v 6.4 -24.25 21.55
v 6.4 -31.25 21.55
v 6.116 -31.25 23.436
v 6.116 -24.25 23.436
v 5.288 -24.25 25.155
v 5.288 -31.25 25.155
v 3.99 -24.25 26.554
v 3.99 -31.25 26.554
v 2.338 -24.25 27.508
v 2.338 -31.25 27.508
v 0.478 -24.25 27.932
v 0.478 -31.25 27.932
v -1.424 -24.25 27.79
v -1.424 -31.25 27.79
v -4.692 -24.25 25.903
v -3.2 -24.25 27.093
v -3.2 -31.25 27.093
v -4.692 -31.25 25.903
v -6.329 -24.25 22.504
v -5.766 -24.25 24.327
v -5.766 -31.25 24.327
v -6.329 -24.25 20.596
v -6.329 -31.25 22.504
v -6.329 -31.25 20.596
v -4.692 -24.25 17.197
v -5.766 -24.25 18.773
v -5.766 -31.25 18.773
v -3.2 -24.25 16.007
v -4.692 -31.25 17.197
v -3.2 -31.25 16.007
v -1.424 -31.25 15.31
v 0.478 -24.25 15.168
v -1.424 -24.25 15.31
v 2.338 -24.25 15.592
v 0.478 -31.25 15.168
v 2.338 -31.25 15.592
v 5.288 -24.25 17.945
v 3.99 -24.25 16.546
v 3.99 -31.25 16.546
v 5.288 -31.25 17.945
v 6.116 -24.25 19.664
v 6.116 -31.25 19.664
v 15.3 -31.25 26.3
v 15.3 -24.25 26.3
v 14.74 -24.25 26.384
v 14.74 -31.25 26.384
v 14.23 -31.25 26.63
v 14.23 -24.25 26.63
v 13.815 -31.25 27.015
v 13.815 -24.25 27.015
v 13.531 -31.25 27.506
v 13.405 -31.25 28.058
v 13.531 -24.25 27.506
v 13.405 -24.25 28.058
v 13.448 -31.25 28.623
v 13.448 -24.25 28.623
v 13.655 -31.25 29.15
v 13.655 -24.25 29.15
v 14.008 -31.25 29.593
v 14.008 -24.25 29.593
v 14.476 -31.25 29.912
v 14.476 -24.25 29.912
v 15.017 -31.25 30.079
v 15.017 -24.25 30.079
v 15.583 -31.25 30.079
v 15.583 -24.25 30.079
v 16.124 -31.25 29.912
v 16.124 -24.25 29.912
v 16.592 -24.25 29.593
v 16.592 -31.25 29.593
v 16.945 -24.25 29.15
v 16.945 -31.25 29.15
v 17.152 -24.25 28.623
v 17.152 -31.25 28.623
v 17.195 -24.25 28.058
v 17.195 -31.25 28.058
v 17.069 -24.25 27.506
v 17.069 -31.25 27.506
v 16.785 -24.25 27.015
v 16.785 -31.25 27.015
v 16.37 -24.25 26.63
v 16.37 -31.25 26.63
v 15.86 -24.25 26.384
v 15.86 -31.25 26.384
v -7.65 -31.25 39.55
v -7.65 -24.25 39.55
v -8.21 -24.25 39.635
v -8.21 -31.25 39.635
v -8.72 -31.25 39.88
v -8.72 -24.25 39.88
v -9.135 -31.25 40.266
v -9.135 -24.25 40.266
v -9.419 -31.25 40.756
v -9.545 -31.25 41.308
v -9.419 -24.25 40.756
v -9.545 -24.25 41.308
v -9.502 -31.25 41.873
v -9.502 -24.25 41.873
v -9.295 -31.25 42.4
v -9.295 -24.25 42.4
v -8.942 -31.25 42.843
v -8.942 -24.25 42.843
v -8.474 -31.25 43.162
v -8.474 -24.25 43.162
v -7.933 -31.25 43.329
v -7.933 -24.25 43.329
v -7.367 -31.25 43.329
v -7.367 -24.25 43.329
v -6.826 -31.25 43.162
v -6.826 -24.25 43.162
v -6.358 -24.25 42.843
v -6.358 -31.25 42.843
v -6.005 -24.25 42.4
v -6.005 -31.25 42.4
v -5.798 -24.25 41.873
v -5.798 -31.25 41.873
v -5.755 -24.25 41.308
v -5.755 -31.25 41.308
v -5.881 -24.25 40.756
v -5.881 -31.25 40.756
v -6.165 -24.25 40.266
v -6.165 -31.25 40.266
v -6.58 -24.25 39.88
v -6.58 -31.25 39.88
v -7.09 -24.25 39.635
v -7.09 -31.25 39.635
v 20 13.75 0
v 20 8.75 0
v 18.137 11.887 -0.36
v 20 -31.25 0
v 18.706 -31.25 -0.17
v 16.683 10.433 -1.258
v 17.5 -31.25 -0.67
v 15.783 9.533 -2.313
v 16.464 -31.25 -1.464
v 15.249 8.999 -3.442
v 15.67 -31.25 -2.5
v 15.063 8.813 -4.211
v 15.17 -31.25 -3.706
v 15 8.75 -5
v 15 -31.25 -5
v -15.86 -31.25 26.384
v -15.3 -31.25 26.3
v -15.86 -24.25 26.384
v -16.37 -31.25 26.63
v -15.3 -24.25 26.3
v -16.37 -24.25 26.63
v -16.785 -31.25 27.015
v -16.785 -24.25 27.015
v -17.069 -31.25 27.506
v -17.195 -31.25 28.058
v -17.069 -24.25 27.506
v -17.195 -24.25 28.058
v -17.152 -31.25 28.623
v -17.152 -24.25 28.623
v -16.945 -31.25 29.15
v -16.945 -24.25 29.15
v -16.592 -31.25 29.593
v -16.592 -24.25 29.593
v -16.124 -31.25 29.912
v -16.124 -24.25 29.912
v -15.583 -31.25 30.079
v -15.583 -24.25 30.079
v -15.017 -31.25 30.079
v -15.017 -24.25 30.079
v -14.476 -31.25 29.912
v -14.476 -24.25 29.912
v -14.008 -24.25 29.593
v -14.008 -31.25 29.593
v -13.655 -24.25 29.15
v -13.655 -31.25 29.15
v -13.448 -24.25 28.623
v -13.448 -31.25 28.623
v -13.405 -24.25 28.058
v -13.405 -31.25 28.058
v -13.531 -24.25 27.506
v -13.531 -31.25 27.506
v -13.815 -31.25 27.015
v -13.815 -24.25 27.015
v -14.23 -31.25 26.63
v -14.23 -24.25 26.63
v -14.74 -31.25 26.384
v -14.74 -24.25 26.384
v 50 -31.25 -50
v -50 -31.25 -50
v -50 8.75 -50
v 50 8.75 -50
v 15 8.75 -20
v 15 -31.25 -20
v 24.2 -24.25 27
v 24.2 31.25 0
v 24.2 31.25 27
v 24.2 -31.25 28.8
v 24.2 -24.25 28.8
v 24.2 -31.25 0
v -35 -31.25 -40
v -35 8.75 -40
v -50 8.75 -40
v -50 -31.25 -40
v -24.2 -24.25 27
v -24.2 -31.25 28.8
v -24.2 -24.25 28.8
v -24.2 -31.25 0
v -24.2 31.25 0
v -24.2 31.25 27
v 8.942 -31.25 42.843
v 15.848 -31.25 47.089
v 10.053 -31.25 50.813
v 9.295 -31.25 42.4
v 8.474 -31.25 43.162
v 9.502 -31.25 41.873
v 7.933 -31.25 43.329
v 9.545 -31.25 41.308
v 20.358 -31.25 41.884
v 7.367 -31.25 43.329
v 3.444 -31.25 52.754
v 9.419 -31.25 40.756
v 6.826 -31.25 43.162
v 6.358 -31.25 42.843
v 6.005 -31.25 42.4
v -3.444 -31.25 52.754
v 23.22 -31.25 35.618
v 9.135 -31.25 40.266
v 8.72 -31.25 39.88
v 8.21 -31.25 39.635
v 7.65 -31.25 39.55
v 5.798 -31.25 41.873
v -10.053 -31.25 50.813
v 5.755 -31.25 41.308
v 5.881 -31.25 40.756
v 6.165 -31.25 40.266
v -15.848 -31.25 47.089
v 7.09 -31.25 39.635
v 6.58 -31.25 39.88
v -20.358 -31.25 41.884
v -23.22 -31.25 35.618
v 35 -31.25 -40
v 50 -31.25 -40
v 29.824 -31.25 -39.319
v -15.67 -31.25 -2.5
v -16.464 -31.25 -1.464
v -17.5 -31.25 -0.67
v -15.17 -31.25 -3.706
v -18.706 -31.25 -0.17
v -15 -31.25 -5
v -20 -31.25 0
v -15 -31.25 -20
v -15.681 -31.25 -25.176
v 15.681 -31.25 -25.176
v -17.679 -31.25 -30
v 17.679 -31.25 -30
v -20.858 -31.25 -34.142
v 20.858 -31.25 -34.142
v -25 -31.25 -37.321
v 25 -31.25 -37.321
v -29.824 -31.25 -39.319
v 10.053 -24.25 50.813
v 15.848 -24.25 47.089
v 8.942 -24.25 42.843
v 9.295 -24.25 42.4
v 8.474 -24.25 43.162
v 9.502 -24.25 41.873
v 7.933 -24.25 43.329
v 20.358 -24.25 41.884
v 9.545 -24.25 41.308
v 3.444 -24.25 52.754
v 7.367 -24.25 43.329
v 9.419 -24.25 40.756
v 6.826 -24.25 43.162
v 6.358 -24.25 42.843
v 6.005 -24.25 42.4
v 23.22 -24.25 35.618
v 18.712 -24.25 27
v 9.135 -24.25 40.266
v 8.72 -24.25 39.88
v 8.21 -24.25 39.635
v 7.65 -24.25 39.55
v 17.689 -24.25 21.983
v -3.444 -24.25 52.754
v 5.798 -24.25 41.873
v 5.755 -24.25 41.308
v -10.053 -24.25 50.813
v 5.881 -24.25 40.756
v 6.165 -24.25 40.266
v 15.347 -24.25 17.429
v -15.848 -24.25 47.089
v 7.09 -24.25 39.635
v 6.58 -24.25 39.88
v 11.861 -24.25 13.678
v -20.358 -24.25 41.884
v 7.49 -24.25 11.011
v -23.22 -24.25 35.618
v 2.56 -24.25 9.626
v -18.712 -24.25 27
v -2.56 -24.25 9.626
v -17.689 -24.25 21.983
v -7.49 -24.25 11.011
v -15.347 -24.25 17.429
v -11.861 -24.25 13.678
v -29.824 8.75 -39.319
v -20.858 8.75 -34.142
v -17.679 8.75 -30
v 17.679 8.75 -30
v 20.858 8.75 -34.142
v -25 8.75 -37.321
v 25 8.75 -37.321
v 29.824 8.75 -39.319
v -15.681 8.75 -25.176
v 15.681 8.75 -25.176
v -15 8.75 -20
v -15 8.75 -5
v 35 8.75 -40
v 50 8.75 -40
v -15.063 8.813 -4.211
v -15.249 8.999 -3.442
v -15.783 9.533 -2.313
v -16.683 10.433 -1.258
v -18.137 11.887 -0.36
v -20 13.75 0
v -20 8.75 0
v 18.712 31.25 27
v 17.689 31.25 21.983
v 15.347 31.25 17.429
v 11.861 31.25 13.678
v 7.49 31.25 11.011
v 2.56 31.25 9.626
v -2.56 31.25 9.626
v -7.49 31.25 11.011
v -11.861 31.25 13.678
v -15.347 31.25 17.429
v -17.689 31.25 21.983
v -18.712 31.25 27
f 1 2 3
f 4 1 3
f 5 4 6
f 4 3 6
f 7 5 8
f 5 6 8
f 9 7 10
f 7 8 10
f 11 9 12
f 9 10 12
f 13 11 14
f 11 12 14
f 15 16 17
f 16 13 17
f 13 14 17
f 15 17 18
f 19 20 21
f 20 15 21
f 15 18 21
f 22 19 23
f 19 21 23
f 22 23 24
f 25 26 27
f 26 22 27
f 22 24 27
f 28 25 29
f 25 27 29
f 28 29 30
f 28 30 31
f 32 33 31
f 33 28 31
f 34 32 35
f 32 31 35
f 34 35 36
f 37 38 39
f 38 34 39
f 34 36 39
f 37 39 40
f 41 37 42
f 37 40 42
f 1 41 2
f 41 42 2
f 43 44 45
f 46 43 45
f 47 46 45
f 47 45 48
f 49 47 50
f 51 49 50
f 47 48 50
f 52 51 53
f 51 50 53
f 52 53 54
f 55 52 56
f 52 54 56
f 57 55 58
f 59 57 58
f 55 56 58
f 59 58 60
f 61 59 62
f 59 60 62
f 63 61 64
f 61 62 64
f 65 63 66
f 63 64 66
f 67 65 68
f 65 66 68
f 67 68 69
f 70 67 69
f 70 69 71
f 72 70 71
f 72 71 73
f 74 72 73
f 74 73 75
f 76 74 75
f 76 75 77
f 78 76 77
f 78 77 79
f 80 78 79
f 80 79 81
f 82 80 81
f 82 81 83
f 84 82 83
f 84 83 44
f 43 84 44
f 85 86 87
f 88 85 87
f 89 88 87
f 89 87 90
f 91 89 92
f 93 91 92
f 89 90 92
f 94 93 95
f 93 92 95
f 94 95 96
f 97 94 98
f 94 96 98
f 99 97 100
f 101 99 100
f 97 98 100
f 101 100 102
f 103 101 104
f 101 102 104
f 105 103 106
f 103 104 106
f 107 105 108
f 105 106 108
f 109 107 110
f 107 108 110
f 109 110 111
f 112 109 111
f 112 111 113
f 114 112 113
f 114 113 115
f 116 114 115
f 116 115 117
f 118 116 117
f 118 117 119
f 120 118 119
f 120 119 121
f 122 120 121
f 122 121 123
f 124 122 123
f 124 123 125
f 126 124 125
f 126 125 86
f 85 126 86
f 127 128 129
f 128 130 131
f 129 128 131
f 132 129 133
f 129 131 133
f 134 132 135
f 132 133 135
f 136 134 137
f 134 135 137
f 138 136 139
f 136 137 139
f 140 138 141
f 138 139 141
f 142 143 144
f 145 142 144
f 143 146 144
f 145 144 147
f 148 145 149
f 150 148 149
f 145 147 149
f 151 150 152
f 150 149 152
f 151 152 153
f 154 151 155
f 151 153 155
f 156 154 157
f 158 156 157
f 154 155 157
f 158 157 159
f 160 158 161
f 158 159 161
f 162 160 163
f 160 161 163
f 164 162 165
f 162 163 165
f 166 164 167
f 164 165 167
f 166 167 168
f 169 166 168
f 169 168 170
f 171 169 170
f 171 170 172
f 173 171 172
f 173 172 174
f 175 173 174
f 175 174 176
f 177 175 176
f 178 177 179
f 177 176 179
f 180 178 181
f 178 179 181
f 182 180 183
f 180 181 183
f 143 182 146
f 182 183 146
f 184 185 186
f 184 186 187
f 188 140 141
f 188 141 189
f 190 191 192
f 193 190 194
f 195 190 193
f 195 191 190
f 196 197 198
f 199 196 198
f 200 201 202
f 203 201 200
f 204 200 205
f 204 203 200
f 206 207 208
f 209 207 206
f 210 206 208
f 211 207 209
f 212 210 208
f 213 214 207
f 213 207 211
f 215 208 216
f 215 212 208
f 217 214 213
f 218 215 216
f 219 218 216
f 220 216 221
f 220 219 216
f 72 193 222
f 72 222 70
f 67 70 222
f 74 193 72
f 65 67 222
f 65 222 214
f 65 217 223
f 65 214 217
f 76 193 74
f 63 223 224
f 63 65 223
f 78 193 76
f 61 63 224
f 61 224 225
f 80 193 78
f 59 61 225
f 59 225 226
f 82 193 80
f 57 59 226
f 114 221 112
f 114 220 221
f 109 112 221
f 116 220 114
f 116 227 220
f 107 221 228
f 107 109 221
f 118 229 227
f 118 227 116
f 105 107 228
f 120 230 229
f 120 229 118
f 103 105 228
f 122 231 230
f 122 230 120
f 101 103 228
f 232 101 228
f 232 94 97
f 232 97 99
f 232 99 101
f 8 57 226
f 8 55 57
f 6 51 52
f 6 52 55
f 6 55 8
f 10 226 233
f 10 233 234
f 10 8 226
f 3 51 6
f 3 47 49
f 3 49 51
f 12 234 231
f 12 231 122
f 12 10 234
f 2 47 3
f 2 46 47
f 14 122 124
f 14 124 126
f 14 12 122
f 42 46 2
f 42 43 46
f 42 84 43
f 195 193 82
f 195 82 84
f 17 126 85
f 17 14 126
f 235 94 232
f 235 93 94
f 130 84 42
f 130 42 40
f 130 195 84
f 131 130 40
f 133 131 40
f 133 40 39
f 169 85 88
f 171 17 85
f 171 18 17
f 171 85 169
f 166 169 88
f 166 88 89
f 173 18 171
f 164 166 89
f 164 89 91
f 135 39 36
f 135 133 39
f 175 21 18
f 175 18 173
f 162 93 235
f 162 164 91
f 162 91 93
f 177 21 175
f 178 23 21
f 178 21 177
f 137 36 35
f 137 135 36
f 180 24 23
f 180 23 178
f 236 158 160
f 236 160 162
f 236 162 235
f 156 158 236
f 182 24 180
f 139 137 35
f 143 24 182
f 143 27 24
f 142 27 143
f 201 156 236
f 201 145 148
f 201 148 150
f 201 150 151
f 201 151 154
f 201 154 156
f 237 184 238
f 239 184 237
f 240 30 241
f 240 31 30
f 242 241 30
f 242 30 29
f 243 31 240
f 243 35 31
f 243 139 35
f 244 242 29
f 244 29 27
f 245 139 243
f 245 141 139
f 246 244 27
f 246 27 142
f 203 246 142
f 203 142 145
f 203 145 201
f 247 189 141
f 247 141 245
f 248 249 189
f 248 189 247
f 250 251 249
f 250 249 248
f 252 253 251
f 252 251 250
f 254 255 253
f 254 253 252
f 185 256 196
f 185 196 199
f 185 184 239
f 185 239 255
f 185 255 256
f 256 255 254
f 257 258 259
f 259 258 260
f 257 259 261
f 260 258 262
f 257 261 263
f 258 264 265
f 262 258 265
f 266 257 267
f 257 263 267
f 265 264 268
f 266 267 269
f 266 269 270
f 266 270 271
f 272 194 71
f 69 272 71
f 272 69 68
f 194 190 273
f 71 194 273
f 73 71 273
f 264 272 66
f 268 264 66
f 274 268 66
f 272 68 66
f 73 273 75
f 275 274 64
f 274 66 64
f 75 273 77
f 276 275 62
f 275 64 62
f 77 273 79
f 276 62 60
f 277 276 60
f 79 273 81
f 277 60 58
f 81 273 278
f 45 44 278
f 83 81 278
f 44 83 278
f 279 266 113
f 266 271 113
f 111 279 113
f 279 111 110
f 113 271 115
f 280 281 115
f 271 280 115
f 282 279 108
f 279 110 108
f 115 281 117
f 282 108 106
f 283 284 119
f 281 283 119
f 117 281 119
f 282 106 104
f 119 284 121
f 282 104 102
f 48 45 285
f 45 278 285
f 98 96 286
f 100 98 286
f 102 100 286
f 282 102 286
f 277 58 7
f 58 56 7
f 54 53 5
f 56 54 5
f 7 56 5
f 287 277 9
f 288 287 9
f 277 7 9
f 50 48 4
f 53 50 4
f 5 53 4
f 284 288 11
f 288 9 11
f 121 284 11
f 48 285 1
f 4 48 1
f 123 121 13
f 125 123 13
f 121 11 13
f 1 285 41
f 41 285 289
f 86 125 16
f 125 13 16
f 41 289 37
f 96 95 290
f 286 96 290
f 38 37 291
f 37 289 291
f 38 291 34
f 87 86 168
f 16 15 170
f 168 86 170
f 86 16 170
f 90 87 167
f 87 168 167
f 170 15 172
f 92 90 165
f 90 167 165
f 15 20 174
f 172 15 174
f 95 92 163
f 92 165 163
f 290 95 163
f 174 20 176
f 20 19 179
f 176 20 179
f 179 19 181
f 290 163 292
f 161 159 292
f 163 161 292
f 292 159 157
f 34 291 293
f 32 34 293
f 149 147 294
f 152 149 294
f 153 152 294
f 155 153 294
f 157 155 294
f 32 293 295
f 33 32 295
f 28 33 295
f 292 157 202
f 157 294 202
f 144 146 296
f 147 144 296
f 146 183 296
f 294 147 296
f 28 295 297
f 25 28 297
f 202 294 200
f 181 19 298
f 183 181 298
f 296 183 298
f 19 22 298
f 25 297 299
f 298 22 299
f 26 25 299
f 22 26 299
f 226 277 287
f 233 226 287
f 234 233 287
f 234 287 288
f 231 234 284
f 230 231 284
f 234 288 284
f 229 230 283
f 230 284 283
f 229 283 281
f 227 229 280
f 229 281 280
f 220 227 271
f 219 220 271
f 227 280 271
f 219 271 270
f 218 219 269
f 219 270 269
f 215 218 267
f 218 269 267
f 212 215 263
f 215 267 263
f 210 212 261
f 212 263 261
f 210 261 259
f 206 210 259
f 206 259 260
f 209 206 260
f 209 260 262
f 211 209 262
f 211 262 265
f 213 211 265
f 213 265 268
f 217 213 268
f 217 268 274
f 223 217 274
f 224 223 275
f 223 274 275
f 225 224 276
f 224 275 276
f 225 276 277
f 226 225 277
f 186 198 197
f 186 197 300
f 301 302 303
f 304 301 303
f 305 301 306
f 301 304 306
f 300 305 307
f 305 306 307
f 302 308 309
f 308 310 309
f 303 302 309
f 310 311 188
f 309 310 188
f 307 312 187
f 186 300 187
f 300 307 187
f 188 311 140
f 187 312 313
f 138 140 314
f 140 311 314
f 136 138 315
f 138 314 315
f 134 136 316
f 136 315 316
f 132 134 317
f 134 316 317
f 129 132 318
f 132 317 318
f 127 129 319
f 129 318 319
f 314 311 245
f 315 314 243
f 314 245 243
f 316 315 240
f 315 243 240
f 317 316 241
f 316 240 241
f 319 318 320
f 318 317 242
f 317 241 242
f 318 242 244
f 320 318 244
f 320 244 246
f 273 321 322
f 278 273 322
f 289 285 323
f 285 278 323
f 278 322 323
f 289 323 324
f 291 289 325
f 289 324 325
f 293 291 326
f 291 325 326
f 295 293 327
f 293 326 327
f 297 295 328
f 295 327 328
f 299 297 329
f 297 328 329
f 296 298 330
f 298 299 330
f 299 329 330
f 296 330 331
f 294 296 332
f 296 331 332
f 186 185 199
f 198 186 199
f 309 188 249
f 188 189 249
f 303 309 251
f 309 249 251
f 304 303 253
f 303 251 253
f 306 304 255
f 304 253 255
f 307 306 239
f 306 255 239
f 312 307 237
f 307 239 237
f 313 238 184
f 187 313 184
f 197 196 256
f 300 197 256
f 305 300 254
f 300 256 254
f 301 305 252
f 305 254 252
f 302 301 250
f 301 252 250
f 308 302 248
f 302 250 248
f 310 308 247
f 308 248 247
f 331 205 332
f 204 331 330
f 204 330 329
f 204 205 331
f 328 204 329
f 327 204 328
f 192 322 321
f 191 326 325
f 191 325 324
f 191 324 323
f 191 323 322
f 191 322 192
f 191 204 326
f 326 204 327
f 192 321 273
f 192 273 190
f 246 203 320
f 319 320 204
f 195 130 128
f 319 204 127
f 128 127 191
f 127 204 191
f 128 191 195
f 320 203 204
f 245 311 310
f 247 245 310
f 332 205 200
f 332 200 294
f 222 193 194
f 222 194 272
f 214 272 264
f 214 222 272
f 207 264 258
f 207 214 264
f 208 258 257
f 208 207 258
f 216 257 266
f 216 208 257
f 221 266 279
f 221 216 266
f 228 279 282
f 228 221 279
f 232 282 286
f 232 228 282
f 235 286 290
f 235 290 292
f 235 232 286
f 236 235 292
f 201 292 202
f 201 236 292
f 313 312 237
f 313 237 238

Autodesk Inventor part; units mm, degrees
ref_plane "YZ Plane" through (0, 0, 0) normal (1, 0, 0) x (0, 1, 0)
ref_plane "XZ Plane" through (0, 0, 0) normal (0, 1, 0) x (-1, 0, 0)
ref_plane "XY Plane" through (0, 0, 0) normal (0, 0, 1) x (1, 0, 0)
sketch "Schizzo1" plane through (0, 0, 0) normal (0, 0, 1) x (1, 0, 0)
  line L0 (9, 6) -> (9, -6)
  line L1 (6, -9) -> (-6, -9)
  line L2 (-9, -6) -> (-9, 6)
  line L3 (-6, 9) -> (6, 9)
  arc A0 (-6, 9) -> (-9, 6) centre (-6, 6) ccw
  arc A1 (-9, -6) -> (-6, -9) centre (-6, -6) ccw
  arc A2 (6, -9) -> (9, -6) centre (6, -6) ccw
  arc A3 (9, 6) -> (6, 9) centre (6, 6) ccw
  point P0 (0, 0)
  point P1 (0, 0)
  point P2 (9, 9)
  point P3 (9, -9)
  point P4 (-9, -9)
  point P5 (-9, 9)
  dimension "d0" = 18
  dimension "d72" = 3
extrude "Estrusione1" add sketch "Schizzo1" against normal blind 40
sketch "Schizzo2" plane through (0, 0, 0) normal (0, 0, 1) x (1, 0, 0)
  line L0 (24.2, -31.25) -> (-24.2, -31.25)
  line L1 (-24.2, -31.25) -> (-24.2, 31.25)
  line L2 (-24.2, 31.25) -> (24.2, 31.25)
  line L3 (24.2, 31.25) -> (24.2, -31.25)
  line L4 (24.2, -31.25) -> (-24.2, 31.25) construction
  line L5 (-24.2, -31.25) -> (24.2, 31.25) construction
  point P0 (0, 0)
  dimension "d3" = 62.5
  dimension "d4" = 48.4
extrude "Estrusione2" add sketch "Schizzo2" along normal blind 53
sketch "Schizzo3" plane through (-24.2, 31.25, 0) normal (0, 1, 0) x (1, 0, 0)
  line L0 (24.2, 0) -> (24.2, -28.2)
  line L1 (24.2, 0) -> (52.4, 0) construction
  circle A0 centre (24.2, -28.2) radius 18.75
  dimension "d7" = 28.2
  dimension "d8" = 90
  dimension "d9" = 37.5
extrude "Estrusione3" cut sketch "Schizzo3" against normal blind 55.5
sketch "Schizzo14" plane through (0, 0, 0) normal (0, 0, -1) x (-1, 0, 0)
  line L0 (-11, 13) -> (11, 13)
  line L1 (13, 11) -> (13, -11)
  line L2 (11, -13) -> (-11, -13)
  line L3 (-13, -11) -> (-13, 11)
  arc A0 (11, -13) -> (13, -11) centre (11, -11) ccw
  arc A1 (-13, -11) -> (-11, -13) centre (-11, -11) ccw
  arc A2 (13, 11) -> (11, 13) centre (11, 11) ccw
  arc A3 (-11, 13) -> (-13, 11) centre (-11, 11) ccw
  line L4 (-9.382, 10.5) -> (9.382, 10.5)
  line L5 (10.5, 9.382) -> (10.5, -9.382)
  line L6 (9.382, -10.5) -> (-9.382, -10.5)
  line L7 (-10.5, -9.382) -> (-10.5, 9.382)
  arc A4 (-10.1273, 10.8333) -> (-10.8333, 10.1273) centre (-10.5, 10.5) ccw
  arc A5 (-10.1273, 10.8333) -> (-9.382, 10.5) centre (-9.382, 11.5) ccw
  arc A6 (-10.5, 9.382) -> (-10.8333, 10.1273) centre (-11.5, 9.382) ccw
  arc A7 (10.8333, 10.1273) -> (10.1273, 10.8333) centre (10.5, 10.5) ccw
  arc A8 (9.382, 10.5) -> (10.1273, 10.8333) centre (9.382, 11.5) ccw
  arc A9 (10.8333, 10.1273) -> (10.5, 9.382) centre (11.5, 9.382) ccw
  arc A10 (10.1273, -10.8333) -> (10.8333, -10.1273) centre (10.5, -10.5) ccw
  arc A11 (10.1273, -10.8333) -> (9.382, -10.5) centre (9.382, -11.5) ccw
  arc A12 (10.5, -9.382) -> (10.8333, -10.1273) centre (11.5, -9.382) ccw
  arc A13 (-10.8333, -10.1273) -> (-10.1273, -10.8333) centre (-10.5, -10.5) ccw
  arc A14 (-9.382, -10.5) -> (-10.1273, -10.8333) centre (-9.382, -11.5) ccw
  arc A15 (-10.8333, -10.1273) -> (-10.5, -9.382) centre (-11.5, -9.382) ccw
  point P0 (0, 0)
  point P1 (0, 0)
  point P2 (-10.5, 10.5)
  point P3 (10.5, 10.5)
  point P4 (10.5, -10.5)
  point P5 (-10.5, -10.5)
  point P6 (0, 0)
  point P7 (-13, 13)
  point P8 (13, 13)
  point P9 (13, -13)
  point P10 (-13, -13)
  point P11 (0, 0)
  point P12 (-10, 10.5)
  point P13 (-10.5, 10)
  point P14 (10.5, 10)
  point P15 (10, 10.5)
  point P16 (10, -10.5)
  point P17 (10.5, -10)
  point P18 (-10.5, -10)
  point P19 (-10, -10.5)
  dimension "d77" = 21
  dimension "d78" = 26
  dimension "d102" = 2
  dimension "d110" = 1
  dimension "d112" = 1
  dimension "d114" = 1
  dimension "d116" = 1
extrude "Estrusione10" add sketch "Schizzo14" along normal blind 40
sketch "Schizzo15" plane through (-13, 13, 0) normal (0, 1, 0) x (1, 0, 0)
  line L0 (13, 0) -> (13, 13)
  line L1 (13, 0) -> (26, 0) construction
  dimension "d82" = 13
  dimension "d83" = 90
hole "Foro4" at (0, 13, -13) direction (0, -1, 0) diameter 5.5 depth 26 clearance for "Vite a testa esagonale" size "M5" standard "ANSI - Profilo M Metrico"
sketch "Schizzo16" plane through (13, -11, 0) normal (1, 0, 0) x (0, 0, -1)
  line L0 (0, 11) -> (27, 11)
  line L1 (0, 11) -> (27, 11) construction
  dimension "d91" = 27
  dimension "d92" = 0
hole "Foro5" at (13, 0, -27) direction (-1, 0, 0) diameter 5.5 depth 26 clearance for "Vite a testa esagonale" size "M5" standard "ANSI - Profilo M Metrico"
fillet "Raccordo1" radius 2 1 edges at (0, -13, -40)
fillet "Raccordo2" radius 2 1 edges at (-9, 0, -40)
fillet "Raccordo3" radius 8 1 edges at (-13, 0, 0)
sketch "Schizzo26" plane through (-24.2, -31.25, 0) normal (0, -1, 0) x (1, 0, 0)
  circle A0 centre (24.2, 28.2) radius 18.75 projected
  line L0 (24.2, 46.95) -> (24.2, 27.55)
  line L1 (24.2, 46.95) -> (43.6, 46.95) construction
  line L2 (24.2, 27.55) -> (24.2, 21.55)
  circle A1 centre (24.2, 21.55) radius 6.4
  point P0 (24.2, 0)
  dimension "d159" = 19.4
  dimension "d160" = 90
  dimension "d161" = 6
  dimension "d162" = 180
  dimension "d163" = 12.8
extrude "Estrusione16" cut sketch "Schizzo26" against normal blind 10 contours A1
sketch "Schizzo27" plane through (-24.2, -31.25, 0) normal (0, -1, 0) x (1, 0, 0)
  circle A0 centre (24.2, 28.2) radius 18.75 projected
  line L0 (24.2, 28.2) -> (39.5, 28.2)
  point P0 (24.2, 0)
  point P1 (31.85, 41.4502)
  point P2 (16.55, 41.4502)
  point P3 (8.9, 28.2)
  point P4 (16.55, 14.9498)
  point P5 (31.85, 14.9498)
  dimension "d166" = 15.3
  dimension "d169" = 360
hole "Foro9" at (-15.3, -31.25, 28.2) at (-7.65, -31.25, 41.4502) at (7.65, -31.25, 41.4502) at (15.3, -31.25, 28.2) direction (0, 1, 0) diameter 3.8 depth 8.8 tip angle 118 clearance for "Vite a testa svasata piana ISO 2009/7046" size "M3" standard "ISO"
sketch "Schizzo28" plane through (-24.2, -31.25, 0) normal (-1, 0, 0) x (0, 0, 1)
  line L0 (53, 62.5) -> (53, 0) projected
  line L1 (53, 0) -> (53, 7)
  line L2 (53, 0) -> (60, 0) construction
  line L3 (53, 7) -> (53, 12)
  line L4 (53, 7) -> (53, 12)
  line L5 (53, 12) -> (37, 12)
  line L6 (53, 12) -> (49.5, 12)
  line L7 (53, 12) -> (56.5, 12) construction
  line L8 (53, 12) -> (49, 12)
  line L9 (37, 12) -> (37, 7)
  line L10 (37, 12) -> (42, 12) construction
  line L11 (37, 7) -> (49, 7)
  line L12 (49, 7) -> (49, 12)
  line L13 (49, 12) -> (37, 12)
  line L14 (37, 12) -> (37, 7)
  line L15 (53, 62.5) -> (53, 53.5)
  line L16 (53, 62.5) -> (62, 62.5) construction
  line L17 (53, 62.5) -> (53, 53.5)
  line L18 (53, 53.5) -> (37, 53.5)
  line L19 (37, 53.5) -> (37, 62.5)
  line L20 (37, 62.5) -> (53, 62.5)
  point P0 (0, 31.25)
  dimension "d178" = 7
  dimension "d179" = 90
  dimension "d180" = 5
  dimension "d181" = 180
  dimension "d184" = 180
  dimension "d185" = 4
  dimension "d186" = 5
  dimension "d187" = 90
  dimension "d188" = 9
  dimension "d189" = 90
  dimension "d190" = 16
extrude "Estrusione17" cut sketch "Schizzo28" against normal through all
full round fillet "Raccordo5" first side at (24.2, -6.4167, 12.3333) centre faces at (8.0667, -13.4167, 53) second side at (-24.2, -6.4167, 12.3333)
sketch "Schizzo30" plane through (16.5566, 22.25, 37) normal (0, 0, 1) x (1, 0, 0)
  line L0 (-39.325, 9) -> (-33.1133, 9) projected
  line L1 (0, 9) -> (6.2118, 9) projected
  line L2 (0, -46.5) -> (0, -41.5) projected
  line L3 (-33.1133, -41.5) -> (-33.1133, -46.5) projected
  line L4 (-40.7566, 9) -> (-40.7566, -53.5) projected
  line L5 (6.2118, 9) -> (6.2118, 0) projected
  line L6 (7.6434, -53.5) -> (7.6434, 9) projected
  line L7 (-40.7566, 9) -> (7.6434, 9)
  line L8 (7.6434, 9) -> (7.6434, -46.5)
  line L9 (7.6434, -46.5) -> (-40.7566, -46.5)
  line L10 (-40.7566, -46.5) -> (-40.7566, 9)
  point P0 (-16.5566, -22.25)
  point P1 (-40.7566, -46.5)
  point P2 (7.6434, 9)
  point P3 (-33.1133, 9)
extrude "Estrusione19" cut sketch "Schizzo30" along normal blind 20 and the other way blind 10
sketch "Schizzo31" plane through (0, 0, 0) normal (0, 0, -1) x (-1, 0, 0)
  line L0 (24.2, 31.25) -> (24.2, -31.25) projected
  line L1 (-24.2, -26.25) -> (24.2, -26.25)
  line L2 (24.2, -26.25) -> (24.2, 26.25)
  line L3 (24.2, 26.25) -> (-24.2, 26.25)
  line L4 (-24.2, 26.25) -> (-24.2, -26.25)
  point P0 (0, 0)
  point P1 (24.2, -26.25)
extrude "Estrusione20" cut sketch "Schizzo31" along normal up to surface (40 mm away)
sketch "Schizzo32" plane through (-24.2, -31.25, 0) normal (0, -1, 0) x (1, 0, 0)
  line L0 (24.2, 0) -> (24.2, -50)
  line L1 (24.2, -50) -> (-25.8, -50)
  line L2 (24.2, -50) -> (74.2, -50)
  line L3 (39.2, 0) -> (9.2, 0)
  line L4 (0, 0) -> (48.4, 0) projected
  line L5 (-25.8, -50) -> (-25.8, -40)
  line L6 (74.2, -50) -> (-25.8, -50)
  line L7 (-25.8, -50) -> (-25.8, -40)
  line L8 (59.2, -40) -> (74.2, -40)
  line L9 (74.2, -40) -> (74.2, -50)
  line L10 (9.2, -5) -> (9.2, -20)
  line L11 (39.2, -5) -> (39.2, -20)
  arc A0 (39.2, -20) -> (59.2, -40) centre (59.2, -20) ccw
  line L12 (-10.8, -40) -> (-25.8, -40)
  arc A1 (-10.8, -40) -> (9.2, -20) centre (-10.8, -20) ccw
  line L13 (4.2, 0) -> (0, 0)
  line L14 (48.4, 0) -> (48.4, 28.8) projected
  line L15 (48.4, 0) -> (44.2, 0)
  arc A2 (44.2, 0) -> (39.2, -5) centre (44.2, -5) ccw
  arc A3 (9.2, -5) -> (4.2, 0) centre (4.2, -5) ccw
  point P0 (24.2, 0)
  point P1 (9.2, -40)
  point P2 (9.2, 0)
  point P3 (4.2, 0)
  dimension "d205" = 50
  dimension "d206" = 50
  dimension "d207" = 50
  dimension "d208" = 30
  dimension "d209" = 10
  dimension "d210" = 20
  dimension "d211" = 20
  dimension "d212" = 5
  dimension "d213" = 5
extrude "Estrusione21" add sketch "Schizzo32" against normal blind 40
fillet "Raccordo6" radius 5 1 edges at (0, 8.75, 0)
properties part number "5_Connettore_sup_inf" material "PLA(Stampato)"
